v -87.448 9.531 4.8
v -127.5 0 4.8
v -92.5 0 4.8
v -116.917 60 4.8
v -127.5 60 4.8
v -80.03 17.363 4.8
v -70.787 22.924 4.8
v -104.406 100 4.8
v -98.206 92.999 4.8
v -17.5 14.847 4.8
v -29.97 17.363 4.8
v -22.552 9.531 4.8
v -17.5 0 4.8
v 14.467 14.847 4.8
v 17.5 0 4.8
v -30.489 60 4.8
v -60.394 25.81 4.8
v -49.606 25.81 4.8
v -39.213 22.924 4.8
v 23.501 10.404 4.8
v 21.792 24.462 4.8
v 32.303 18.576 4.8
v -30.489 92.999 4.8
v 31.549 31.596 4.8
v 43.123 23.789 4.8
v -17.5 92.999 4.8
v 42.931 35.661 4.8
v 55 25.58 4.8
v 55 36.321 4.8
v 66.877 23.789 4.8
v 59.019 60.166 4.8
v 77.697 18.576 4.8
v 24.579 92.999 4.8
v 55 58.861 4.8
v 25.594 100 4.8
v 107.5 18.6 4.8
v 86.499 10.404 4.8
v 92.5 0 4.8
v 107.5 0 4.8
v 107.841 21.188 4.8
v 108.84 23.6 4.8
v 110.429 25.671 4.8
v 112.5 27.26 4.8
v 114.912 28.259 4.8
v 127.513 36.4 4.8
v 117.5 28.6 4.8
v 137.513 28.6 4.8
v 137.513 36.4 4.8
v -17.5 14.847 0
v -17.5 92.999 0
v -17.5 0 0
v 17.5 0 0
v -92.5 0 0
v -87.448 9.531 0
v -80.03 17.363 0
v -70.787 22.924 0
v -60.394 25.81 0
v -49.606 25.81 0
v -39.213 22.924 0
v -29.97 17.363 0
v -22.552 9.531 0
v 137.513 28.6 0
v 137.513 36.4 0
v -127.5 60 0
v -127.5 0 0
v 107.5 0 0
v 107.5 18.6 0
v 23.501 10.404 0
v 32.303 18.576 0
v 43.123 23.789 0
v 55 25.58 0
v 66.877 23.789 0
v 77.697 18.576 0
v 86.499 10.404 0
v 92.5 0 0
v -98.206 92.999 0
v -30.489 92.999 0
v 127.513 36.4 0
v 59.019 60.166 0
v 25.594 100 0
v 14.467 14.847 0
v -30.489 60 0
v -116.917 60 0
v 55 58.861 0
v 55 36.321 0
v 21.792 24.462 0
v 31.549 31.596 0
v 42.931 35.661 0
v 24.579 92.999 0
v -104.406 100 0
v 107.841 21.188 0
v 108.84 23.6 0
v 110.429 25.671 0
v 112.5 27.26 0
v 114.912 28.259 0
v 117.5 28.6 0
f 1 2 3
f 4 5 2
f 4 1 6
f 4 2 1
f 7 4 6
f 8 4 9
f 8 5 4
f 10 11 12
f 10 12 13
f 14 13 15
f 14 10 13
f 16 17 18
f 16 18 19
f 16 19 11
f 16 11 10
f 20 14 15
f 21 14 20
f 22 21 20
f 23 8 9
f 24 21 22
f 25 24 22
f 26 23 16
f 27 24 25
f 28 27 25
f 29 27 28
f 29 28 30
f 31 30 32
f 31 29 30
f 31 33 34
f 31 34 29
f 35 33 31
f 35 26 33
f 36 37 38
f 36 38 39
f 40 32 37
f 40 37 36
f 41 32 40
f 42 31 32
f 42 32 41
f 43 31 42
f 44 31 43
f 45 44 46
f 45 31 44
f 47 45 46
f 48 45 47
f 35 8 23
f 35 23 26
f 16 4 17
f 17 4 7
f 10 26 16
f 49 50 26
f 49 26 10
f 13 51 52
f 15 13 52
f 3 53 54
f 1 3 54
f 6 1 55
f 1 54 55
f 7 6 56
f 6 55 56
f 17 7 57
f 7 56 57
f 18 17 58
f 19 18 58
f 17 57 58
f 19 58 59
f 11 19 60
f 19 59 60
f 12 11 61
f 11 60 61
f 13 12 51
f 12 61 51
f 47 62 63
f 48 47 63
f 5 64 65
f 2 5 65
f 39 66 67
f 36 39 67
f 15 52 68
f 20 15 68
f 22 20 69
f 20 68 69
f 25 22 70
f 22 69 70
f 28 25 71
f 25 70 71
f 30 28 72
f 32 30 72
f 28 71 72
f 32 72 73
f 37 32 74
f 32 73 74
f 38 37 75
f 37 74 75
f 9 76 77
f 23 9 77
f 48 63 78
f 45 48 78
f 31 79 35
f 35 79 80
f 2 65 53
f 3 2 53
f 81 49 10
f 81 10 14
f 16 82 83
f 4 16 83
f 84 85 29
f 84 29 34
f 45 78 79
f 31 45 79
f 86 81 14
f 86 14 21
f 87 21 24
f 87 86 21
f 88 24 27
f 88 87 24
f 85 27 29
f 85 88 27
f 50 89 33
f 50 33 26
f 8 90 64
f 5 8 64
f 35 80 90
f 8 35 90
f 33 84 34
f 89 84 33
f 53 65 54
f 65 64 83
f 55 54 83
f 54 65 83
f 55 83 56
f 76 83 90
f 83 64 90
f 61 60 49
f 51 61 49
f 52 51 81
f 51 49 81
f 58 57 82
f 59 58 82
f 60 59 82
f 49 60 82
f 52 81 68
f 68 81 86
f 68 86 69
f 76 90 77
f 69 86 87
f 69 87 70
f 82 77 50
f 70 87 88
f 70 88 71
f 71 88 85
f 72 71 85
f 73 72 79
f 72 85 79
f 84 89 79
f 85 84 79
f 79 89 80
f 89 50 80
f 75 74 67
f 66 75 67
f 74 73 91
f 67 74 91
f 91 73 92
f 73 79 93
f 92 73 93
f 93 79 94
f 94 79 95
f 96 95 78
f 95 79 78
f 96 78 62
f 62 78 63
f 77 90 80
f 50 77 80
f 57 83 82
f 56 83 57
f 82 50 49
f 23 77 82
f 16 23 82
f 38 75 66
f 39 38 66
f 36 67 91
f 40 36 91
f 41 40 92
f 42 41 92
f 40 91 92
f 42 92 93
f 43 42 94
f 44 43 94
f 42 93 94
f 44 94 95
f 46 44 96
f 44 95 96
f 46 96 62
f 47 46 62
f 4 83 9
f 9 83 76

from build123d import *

# Parameters (mm, degrees)
SALIENTE_EXTRUIR2_DEPTH = 4.8


with BuildPart() as part:
    # Croquis1 → Saliente-Extruir2 (new body)
    with BuildSketch(Plane.XY):
        with BuildLine():
            Line((-17.5, 0), (17.5, 0))
            ThreePointArc((17.5, 0), (55, 25.580282757), (92.5, 0))
            Line((92.5, 0), (107.5, 0))
            Line((107.5, 0), (107.5, 18.6))
            ThreePointArc((107.5, 18.6), (110.428932188, 25.671067812), (117.5, 28.6))
            Line((117.5, 28.6), (137.513068614, 28.6))
            Line((137.513068614, 28.6), (137.513068614, 36.4))
            Line((137.513068614, 36.4), (127.513068614, 36.4))
            Line((127.513068614, 36.4), (59.018966471, 60.165688958))
            Line((59.018966471, 60.165688958), (25.594010768, 100))
            Line((25.594010768, 100), (-104.405989232, 100))
            Line((-104.405989232, 100), (-127.5, 60))
            Line((-127.5, 60), (-127.5, 0))
            Line((-127.5, 0), (-92.5, 0))
            ThreePointArc((-92.5, 0), (-55, 26.176046527), (-17.5, 0))
        make_face()
        Polygon((-116.916975087, 60), (-98.205737613, 92.999006125), (-30.488878185, 92.999006125), (-30.488878185, 60), align=None, mode=Mode.SUBTRACT)
        with BuildLine():
            Line((-17.5, 92.999006125), (-17.5, 14.847400468))
            Line((-17.5, 14.847400468), (14.466697892, 14.847400468))
            ThreePointArc((14.466697892, 14.847400468), (31.548577024, 31.595792779), (55, 36.321255728))
            Line((55, 36.321255728), (55, 58.860748488))
            Line((55, 58.860748488), (24.578803898, 92.999006125))
            Line((24.578803898, 92.999006125), (-17.5, 92.999006125))
        make_face(mode=Mode.SUBTRACT)
    extrude(amount=SALIENTE_EXTRUIR2_DEPTH)


solid = part.part
